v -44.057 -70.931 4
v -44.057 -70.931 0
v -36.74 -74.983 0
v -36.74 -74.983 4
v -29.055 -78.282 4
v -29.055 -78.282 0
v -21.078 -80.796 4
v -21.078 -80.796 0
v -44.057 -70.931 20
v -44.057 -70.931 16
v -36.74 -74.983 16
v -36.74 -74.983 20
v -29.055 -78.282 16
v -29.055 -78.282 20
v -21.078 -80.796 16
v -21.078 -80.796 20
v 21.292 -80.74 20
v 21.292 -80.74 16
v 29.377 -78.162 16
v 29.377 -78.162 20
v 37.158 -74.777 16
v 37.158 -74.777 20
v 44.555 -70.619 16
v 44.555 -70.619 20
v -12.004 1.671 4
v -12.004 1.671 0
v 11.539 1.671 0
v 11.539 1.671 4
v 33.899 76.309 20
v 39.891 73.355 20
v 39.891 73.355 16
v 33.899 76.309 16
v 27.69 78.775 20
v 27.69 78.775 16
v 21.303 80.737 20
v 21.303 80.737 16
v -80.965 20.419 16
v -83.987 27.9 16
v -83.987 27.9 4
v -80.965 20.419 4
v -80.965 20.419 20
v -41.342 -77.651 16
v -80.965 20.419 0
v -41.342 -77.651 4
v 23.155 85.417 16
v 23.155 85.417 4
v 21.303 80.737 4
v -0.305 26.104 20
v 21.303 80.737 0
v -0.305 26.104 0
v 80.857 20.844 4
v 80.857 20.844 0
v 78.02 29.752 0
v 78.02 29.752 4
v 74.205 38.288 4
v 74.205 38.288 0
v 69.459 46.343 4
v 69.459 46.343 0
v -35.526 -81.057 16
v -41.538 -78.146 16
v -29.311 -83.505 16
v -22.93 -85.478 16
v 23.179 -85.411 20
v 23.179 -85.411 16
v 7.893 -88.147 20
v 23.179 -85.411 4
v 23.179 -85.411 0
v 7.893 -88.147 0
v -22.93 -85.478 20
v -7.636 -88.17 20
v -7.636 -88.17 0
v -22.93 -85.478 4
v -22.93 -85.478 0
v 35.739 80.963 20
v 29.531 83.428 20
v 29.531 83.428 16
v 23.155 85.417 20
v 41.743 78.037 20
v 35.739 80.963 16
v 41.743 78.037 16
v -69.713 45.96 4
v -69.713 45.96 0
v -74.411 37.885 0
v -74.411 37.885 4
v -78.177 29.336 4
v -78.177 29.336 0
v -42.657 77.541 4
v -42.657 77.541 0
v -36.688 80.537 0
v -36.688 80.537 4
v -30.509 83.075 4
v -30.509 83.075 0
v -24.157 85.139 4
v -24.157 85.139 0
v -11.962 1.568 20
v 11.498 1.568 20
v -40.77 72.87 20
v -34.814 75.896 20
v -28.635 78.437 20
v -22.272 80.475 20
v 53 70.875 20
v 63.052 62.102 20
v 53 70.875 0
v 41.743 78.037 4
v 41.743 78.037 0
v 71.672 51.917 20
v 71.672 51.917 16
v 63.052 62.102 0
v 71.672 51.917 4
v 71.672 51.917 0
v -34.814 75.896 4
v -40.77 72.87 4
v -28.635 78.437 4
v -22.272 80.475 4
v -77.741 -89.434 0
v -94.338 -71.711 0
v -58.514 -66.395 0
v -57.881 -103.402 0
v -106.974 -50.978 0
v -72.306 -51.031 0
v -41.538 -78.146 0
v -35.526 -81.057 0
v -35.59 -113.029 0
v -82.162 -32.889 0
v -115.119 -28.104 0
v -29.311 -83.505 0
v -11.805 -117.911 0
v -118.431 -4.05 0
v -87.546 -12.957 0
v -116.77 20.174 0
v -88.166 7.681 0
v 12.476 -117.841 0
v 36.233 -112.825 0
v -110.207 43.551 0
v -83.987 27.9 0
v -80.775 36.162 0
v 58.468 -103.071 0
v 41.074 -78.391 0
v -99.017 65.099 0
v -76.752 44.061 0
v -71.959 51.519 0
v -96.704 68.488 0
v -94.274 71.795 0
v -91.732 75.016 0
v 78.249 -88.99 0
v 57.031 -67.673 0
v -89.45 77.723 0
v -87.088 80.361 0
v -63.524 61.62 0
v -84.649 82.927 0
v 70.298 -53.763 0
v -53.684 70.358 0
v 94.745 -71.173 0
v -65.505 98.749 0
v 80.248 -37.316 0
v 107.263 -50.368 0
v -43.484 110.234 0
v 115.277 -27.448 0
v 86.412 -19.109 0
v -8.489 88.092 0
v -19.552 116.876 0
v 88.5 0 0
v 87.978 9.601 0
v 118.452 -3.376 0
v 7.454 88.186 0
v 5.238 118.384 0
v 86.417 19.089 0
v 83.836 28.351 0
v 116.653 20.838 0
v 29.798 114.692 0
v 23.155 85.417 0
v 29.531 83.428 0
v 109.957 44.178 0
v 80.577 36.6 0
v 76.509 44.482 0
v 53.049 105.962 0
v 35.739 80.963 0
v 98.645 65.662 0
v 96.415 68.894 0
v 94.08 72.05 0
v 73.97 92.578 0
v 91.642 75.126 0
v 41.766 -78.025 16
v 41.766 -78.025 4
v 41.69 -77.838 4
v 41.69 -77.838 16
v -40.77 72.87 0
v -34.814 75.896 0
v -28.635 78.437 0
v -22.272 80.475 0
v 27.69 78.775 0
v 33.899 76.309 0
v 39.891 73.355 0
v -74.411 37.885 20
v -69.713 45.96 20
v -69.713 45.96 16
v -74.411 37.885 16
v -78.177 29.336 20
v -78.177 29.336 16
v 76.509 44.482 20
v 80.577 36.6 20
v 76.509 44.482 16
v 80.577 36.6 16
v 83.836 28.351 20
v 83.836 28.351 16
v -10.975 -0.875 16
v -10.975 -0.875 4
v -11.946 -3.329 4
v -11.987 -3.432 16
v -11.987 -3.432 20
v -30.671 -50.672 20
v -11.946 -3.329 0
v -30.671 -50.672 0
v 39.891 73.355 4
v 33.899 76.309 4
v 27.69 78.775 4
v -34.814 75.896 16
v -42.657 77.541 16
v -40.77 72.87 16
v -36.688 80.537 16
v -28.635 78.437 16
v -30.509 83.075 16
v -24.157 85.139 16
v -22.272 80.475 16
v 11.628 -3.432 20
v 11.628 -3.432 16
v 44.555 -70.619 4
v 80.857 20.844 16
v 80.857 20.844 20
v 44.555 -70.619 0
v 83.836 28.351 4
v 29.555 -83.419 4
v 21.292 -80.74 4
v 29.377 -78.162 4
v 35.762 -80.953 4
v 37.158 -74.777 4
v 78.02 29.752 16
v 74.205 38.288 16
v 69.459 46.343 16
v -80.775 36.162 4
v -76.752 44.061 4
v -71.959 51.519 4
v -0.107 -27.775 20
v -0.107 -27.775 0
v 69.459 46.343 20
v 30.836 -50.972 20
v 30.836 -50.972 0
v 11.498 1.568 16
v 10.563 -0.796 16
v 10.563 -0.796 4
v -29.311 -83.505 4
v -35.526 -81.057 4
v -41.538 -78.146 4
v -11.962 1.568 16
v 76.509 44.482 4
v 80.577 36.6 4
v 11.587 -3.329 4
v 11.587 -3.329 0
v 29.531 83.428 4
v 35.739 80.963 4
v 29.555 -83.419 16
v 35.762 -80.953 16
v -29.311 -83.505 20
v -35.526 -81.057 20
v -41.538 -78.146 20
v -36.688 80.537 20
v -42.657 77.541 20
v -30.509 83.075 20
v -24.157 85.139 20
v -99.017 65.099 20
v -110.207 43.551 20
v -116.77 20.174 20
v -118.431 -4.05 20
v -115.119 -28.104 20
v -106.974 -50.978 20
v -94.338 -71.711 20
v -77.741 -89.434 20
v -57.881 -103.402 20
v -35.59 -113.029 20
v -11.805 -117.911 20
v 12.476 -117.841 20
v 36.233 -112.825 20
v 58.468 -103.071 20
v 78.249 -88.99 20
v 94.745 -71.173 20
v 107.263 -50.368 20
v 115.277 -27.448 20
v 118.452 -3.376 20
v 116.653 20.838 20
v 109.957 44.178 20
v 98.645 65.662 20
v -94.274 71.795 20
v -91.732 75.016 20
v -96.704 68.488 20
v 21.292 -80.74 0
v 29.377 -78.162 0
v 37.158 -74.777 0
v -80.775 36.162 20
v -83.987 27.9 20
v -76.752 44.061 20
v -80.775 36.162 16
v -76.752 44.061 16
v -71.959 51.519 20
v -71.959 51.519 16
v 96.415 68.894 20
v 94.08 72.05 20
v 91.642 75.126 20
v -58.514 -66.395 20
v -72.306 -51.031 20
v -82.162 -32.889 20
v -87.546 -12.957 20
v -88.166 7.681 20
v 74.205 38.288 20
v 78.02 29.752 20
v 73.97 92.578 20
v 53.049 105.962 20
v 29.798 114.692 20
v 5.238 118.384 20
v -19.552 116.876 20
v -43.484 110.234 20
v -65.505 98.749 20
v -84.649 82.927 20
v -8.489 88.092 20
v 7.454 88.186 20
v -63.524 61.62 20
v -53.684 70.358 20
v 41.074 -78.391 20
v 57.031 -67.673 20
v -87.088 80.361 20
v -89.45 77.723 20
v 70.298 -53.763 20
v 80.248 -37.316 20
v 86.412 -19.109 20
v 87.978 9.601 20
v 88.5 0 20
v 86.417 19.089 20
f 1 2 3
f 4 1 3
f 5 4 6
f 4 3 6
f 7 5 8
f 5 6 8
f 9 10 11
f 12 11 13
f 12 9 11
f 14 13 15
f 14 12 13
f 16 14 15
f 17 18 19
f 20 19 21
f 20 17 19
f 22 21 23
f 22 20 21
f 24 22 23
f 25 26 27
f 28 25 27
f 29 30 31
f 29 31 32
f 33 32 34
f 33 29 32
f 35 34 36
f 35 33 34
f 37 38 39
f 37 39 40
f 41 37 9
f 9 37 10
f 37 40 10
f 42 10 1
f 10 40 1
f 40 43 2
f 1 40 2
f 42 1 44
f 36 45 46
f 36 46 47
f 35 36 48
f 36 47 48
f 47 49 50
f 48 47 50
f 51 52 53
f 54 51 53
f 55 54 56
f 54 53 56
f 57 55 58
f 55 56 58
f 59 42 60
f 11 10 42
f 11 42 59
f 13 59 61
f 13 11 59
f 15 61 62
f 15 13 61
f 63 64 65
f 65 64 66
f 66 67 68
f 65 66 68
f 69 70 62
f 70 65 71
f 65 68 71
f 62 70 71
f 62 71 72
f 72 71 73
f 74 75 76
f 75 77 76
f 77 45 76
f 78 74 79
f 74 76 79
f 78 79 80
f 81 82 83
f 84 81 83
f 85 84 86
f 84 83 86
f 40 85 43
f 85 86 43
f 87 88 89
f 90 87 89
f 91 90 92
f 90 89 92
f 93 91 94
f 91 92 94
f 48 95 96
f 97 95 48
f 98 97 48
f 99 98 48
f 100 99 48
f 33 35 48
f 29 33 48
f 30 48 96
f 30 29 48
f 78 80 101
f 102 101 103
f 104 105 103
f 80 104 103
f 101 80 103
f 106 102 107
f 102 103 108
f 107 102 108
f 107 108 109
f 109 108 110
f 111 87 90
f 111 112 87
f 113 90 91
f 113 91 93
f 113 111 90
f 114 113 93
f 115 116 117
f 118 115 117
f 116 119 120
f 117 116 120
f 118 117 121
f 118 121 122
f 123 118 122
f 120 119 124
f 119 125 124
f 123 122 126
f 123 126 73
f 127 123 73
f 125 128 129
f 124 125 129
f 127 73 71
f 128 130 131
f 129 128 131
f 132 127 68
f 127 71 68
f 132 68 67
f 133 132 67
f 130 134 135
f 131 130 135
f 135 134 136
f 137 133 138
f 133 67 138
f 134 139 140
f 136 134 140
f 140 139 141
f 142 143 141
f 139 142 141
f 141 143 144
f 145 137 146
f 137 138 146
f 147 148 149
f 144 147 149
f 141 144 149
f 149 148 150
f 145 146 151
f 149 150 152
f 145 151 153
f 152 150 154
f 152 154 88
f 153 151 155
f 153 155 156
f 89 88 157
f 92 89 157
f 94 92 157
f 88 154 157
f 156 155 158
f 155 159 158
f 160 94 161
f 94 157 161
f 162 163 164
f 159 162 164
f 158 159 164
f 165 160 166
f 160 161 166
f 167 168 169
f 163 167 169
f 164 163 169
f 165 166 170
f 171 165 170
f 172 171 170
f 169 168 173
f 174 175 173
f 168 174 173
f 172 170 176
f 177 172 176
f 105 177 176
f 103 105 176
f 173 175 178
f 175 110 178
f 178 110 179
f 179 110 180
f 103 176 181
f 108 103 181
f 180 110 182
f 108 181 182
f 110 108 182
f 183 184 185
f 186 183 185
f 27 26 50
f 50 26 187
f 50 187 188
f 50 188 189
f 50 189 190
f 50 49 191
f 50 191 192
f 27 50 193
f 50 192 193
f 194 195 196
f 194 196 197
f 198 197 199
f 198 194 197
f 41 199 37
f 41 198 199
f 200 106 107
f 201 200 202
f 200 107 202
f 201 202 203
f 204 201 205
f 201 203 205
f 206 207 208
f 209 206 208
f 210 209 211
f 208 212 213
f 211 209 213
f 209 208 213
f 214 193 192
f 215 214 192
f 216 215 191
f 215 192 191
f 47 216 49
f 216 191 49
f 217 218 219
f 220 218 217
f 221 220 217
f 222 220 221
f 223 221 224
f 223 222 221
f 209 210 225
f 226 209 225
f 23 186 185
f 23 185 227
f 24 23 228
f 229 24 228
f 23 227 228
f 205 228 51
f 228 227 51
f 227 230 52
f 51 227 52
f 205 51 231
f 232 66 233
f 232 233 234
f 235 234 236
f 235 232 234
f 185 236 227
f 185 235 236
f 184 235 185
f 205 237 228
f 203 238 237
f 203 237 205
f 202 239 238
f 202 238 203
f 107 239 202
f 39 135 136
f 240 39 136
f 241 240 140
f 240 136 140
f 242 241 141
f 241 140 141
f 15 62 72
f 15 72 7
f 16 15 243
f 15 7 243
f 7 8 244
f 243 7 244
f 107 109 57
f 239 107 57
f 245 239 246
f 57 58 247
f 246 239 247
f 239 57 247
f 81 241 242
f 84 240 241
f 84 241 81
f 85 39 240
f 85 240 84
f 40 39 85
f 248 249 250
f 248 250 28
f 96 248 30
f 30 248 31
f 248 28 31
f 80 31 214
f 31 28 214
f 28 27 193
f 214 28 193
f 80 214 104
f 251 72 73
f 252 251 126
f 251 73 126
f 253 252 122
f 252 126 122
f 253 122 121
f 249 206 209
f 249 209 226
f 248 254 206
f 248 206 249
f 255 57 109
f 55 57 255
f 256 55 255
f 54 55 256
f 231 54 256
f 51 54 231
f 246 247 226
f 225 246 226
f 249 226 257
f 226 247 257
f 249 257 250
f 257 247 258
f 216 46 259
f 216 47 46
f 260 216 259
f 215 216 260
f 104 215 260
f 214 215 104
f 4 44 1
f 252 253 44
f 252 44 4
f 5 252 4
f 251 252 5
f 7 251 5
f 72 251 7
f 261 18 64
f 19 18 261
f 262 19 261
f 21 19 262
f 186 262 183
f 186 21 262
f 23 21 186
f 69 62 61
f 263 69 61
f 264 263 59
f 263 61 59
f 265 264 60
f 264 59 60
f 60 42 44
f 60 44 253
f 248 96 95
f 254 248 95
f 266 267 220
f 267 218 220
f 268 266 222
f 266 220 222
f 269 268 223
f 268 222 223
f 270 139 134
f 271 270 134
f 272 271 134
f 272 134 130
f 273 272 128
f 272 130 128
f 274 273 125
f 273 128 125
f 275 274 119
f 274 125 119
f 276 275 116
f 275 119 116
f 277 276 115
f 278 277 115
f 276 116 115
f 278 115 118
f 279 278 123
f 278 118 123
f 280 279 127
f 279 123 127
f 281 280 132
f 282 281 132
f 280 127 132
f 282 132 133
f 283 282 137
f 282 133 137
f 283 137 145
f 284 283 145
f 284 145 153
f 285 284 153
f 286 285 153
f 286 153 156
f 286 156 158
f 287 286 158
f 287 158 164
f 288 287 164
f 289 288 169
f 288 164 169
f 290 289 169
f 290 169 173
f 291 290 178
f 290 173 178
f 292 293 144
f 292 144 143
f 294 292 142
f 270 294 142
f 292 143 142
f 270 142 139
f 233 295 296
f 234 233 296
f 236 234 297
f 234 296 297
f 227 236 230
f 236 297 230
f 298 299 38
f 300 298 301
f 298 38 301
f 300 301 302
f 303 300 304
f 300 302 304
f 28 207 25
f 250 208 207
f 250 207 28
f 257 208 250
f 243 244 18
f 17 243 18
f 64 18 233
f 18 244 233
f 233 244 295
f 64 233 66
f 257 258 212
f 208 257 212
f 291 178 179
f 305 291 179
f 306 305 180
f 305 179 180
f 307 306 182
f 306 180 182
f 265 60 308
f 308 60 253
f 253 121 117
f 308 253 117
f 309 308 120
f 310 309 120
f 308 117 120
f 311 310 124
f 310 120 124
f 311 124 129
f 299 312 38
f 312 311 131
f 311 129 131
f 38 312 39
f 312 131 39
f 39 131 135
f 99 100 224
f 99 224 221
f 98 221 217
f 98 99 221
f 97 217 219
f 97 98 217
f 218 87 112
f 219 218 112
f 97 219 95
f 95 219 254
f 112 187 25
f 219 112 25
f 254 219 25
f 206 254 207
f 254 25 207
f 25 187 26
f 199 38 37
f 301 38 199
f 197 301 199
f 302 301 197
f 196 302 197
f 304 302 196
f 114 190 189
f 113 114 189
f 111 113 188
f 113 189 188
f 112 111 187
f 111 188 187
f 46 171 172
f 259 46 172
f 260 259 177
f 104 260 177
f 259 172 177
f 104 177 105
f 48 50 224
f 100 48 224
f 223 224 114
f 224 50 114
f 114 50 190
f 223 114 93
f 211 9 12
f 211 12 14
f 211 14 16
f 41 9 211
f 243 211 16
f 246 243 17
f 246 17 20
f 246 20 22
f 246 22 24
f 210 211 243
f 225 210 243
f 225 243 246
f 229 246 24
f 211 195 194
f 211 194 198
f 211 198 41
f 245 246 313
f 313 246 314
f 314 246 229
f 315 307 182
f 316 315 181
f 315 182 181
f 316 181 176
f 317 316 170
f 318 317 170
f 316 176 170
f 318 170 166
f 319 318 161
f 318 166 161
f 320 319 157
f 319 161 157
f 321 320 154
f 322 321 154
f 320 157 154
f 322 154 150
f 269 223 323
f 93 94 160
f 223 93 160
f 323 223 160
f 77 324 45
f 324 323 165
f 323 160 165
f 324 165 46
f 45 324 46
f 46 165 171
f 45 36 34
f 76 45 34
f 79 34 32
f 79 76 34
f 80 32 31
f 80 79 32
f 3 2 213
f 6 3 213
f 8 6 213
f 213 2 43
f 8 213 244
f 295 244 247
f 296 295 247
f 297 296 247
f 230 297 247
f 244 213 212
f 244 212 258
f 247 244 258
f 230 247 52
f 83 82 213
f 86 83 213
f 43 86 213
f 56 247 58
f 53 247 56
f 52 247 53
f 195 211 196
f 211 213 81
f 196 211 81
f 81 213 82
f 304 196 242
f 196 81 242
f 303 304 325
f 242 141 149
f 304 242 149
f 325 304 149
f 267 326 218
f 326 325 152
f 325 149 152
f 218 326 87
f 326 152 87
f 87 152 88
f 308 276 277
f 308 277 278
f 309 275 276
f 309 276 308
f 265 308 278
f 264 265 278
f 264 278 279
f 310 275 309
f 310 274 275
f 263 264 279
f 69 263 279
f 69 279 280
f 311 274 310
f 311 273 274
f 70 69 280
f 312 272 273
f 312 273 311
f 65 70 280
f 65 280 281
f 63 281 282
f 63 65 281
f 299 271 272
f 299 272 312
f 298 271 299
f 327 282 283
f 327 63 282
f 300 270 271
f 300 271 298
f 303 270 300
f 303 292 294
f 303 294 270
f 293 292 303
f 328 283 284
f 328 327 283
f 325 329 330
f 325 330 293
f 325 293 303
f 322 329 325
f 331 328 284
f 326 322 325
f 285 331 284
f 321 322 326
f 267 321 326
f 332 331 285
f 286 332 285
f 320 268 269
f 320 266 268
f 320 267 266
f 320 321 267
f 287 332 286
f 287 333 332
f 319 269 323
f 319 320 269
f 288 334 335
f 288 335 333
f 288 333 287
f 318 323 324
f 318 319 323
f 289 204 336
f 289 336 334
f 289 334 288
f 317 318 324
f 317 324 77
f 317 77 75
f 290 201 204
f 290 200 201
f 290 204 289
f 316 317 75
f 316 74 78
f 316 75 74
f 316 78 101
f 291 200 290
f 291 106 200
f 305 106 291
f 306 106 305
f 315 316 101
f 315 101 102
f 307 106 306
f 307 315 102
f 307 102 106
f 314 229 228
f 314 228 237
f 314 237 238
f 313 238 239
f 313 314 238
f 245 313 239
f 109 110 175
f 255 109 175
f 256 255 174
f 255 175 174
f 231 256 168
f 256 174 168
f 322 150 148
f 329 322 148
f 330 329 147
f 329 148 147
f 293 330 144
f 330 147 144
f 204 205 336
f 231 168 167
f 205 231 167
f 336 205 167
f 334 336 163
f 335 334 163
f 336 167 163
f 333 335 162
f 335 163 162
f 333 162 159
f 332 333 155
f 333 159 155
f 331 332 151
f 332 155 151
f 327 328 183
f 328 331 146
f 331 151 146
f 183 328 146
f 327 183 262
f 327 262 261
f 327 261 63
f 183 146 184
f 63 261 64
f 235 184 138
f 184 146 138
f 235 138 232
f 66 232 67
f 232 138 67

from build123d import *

# Parameters (mm, degrees)
F1_DEPTH  = 20
F3_DEPTH  = 20
F2_R      = 88.5
F2_R_2    = 83.5
F4_DEPTH  = 4
F6_DEPTH  = 4
F8_DEPTH  = 4
F10_DEPTH = 4


with BuildPart() as f1:
    # F0 (on Top) → F1 (new body)
    with BuildSketch(Plane.XY):
        with BuildLine():
            ThreePointArc((-99.0167204009, 65.0994553054), (-33.976231637, -113.5247359995), (118.5, 0))
            ThreePointArc((118.5, 0), (113.427568701, 34.2992224195), (98.6445289691, 65.6620659473))
            Line((98.6445289691, 65.6620659473), (83.8359894773, 28.3509588615))
            ThreePointArc((83.8359894773, 28.3509588615), (87.3262133289, 14.3660177374), (88.5, 0))
            ThreePointArc((88.5, 0), (75.9227513097, -45.4751122436), (41.7658568686, -78.0247601729))
            ThreePointArc((41.7658568686, -78.0247601729), (37.4975464632, -80.1634830159), (33.1201145514, -82.0689223282))
            ThreePointArc((33.1201145514, -82.0689223282), (28.1992209584, -83.8871500132), (23.1792402745, -85.4106130425))
            ThreePointArc((23.1792402745, -85.4106130425), (0.1291202837, -88.4999058076), (-22.9299160381, -85.4778857395))
            ThreePointArc((-22.9299160381, -85.4778857395), (-27.7305413867, -84.0432452634), (-32.4422838504, -82.3392264876))
            ThreePointArc((-32.4422838504, -82.3392264876), (-37.0493645428, -80.3716031131), (-41.5377286395, -78.1464464929))
            ThreePointArc((-41.5377286395, -78.1464464929), (-82.1619405668, -32.888683803), (-83.9871522499, 27.8999687625))
            Line((-83.9871522499, 27.8999687625), (-99.0167204009, 65.0994553054))
        make_face()
        with BuildLine():
            Line((83.8359894773, 28.3509588615), (98.6445289691, 65.6620659473))
            ThreePointArc((98.6445289691, 65.6620659473), (95.2609020622, 70.4812779275), (91.6420527878, 75.1264544673))
            Line((91.6420527878, 75.1264544673), (78.2404891828, 41.3603173639))
            ThreePointArc((78.2404891828, 41.3603173639), (81.2988750591, 34.9677410499), (83.8359894773, 28.3509588615))
        make_face()
        with BuildLine():
            ThreePointArc((-91.7323358048, 75.0161887049), (-95.5033298433, 70.1524339481), (-99.0167204009, 65.0994553054))
            Line((-99.0167204009, 65.0994553054), (-83.9871522499, 27.8999687625))
            ThreePointArc((-83.9871522499, 27.8999687625), (-81.3673031633, 34.8082170749), (-78.1803580333, 41.4738666848))
            Line((-78.1803580333, 41.4738666848), (-91.7323358048, 75.0161887049))
        make_face()
        with BuildLine():
            Line((78.2404891828, 41.3603173639), (91.6420527878, 75.1264544673))
            ThreePointArc((91.6420527878, 75.1264544673), (88.0042632721, 79.3567870187), (84.1713836102, 83.4111993748))
            Line((84.1713836102, 83.4111993748), (71.6717000696, 51.9174094994))
            ThreePointArc((71.6717000696, 51.9174094994), (75.141727224, 46.7543669597), (78.2404891828, 41.3603173639))
        make_face()
        with BuildLine():
            ThreePointArc((-84.6487172303, 82.9267427991), (-88.279177522, 79.0508495593), (-91.7323358048, 75.0161887049))
            Line((-91.7323358048, 75.0161887049), (-78.1803580333, 41.4738666848))
            ThreePointArc((-78.1803580333, 41.4738666848), (-75.2374774209, 46.6001286623), (-71.9589677924, 51.5185107923))
            Line((-71.9589677924, 51.5185107923), (-84.6487172303, 82.9267427991))
        make_face()
        with BuildLine():
            Line((71.6717000696, 51.9174094994), (84.1713836102, 83.4111993748))
            ThreePointArc((84.1713836102, 83.4111993748), (-0.34005351, 118.4995120817), (-84.6487172303, 82.9267427991))
            Line((-84.6487172303, 82.9267427991), (-71.9589677924, 51.5185107923))
            ThreePointArc((-71.9589677924, 51.5185107923), (-58.7666735297, 66.1719584285), (-42.657447205, 77.5409066104))
            ThreePointArc((-42.657447205, 77.5409066104), (-37.9880889567, 79.9321906207), (-33.1852472612, 82.0426070052))
            ThreePointArc((-33.1852472612, 82.0426070052), (-28.7127568961, 83.7127683894), (-24.1567096164, 85.1393174774))
            ThreePointArc((-24.1567096164, 85.1393174774), (-0.5199906824, 88.4984723579), (23.1545696711, 85.4173044725))
            ThreePointArc((23.1545696711, 85.4173044725), (27.9506996195, 83.9702827837), (32.6572676565, 82.2541966663))
            ThreePointArc((32.6572676565, 82.2541966663), (37.2598684434, 80.274231255), (41.7430426186, 78.0369681173))
            ThreePointArc((41.7430426186, 78.0369681173), (58.1917846466, 66.6780788538), (71.6717000696, 51.9174094994))
        make_face()
    extrude(amount=F1_DEPTH)

    # F0 (on Top) → F3 (join)
    with BuildSketch(Plane.XY):
        Polygon((-5.3900272877, 13.2470234608), (-10.9754492604, -0.8747899922), (-5.5413465001, -14.3246662942), (0.0440754726, -0.2028528412), align=None)
        Polygon((-5.5413465001, -14.3246662942), (-0.1072437399, -27.7745425962), (5.4781782329, -13.6527291432), (0.0440754726, -0.2028528412), align=None)
        Polygon((5.4781782329, -13.6527291432), (10.5633239718, -0.7957812068), (5.1292212115, 12.6540950952), (0.0440754726, -0.2028528412), align=None)
        Polygon((0.0440754726, -0.2028528412), (5.1292212115, 12.6540950952), (-0.3048815487, 26.1039713972), (-5.3900272877, 13.2470234608), align=None)
        Polygon((-10.9754492604, -0.8747899922), (-30.6712140088, -50.6722658047), (-25.2371112485, -64.1221421067), (-5.5413465001, -14.3246662942), align=None)
        with BuildLine():
            Line((-25.2371112485, -64.1221421067), (-32.4422838504, -82.3392264876))
            ThreePointArc((-32.4422838504, -82.3392264876), (-27.7305413867, -84.0432452634), (-22.9299160381, -85.4778857395))
            Line((-22.9299160381, -85.4778857395), (-0.1072437399, -27.7745425962))
            Line((-0.1072437399, -27.7745425962), (-5.5413465001, -14.3246662942))
            Line((-5.5413465001, -14.3246662942), (-25.2371112485, -64.1221421067))
        make_face()
        with BuildLine():
            Line((-41.3417817205, -77.6510271941), (-41.5377286395, -78.1464464929))
            ThreePointArc((-41.5377286395, -78.1464464929), (-37.0493645428, -80.3716031131), (-32.4422838504, -82.3392264876))
            Line((-32.4422838504, -82.3392264876), (-25.2371112485, -64.1221421067))
            Line((-25.2371112485, -64.1221421067), (-30.6712140088, -50.6722658047))
            Line((-30.6712140088, -50.6722658047), (-35.7563597477, -63.5292137411))
            Line((-35.7563597477, -63.5292137411), (-41.3417817205, -77.6510271941))
        make_face()
        with BuildLine():
            ThreePointArc((-71.9589677924, 51.5185107923), (-75.2374774209, 46.6001286623), (-78.1803580333, 41.4738666848))
            Line((-78.1803580333, 41.4738666848), (-35.7563597477, -63.5292137411))
            Line((-35.7563597477, -63.5292137411), (-30.6712140088, -50.6722658047))
            Line((-30.6712140088, -50.6722658047), (-71.9589677924, 51.5185107923))
        make_face()
        with BuildLine():
            ThreePointArc((-78.1803580333, 41.4738666848), (-81.3673031633, 34.8082170749), (-83.9871522499, 27.8999687625))
            Line((-83.9871522499, 27.8999687625), (-41.3417817205, -77.6510271941))
            Line((-41.3417817205, -77.6510271941), (-35.7563597477, -63.5292137411))
            Line((-35.7563597477, -63.5292137411), (-78.1803580333, 41.4738666848))
        make_face()
        with BuildLine():
            Line((5.1292212115, 12.6540950952), (32.6572676565, 82.2541966663))
            ThreePointArc((32.6572676565, 82.2541966663), (27.9506996195, 83.9702827837), (23.1545696711, 85.4173044725))
            Line((23.1545696711, 85.4173044725), (-0.3048815487, 26.1039713972))
            Line((-0.3048815487, 26.1039713972), (5.1292212115, 12.6540950952))
        make_face()
        with BuildLine():
            Line((10.5633239718, -0.7957812068), (41.7430426186, 78.0369681173))
            ThreePointArc((41.7430426186, 78.0369681173), (37.2598684434, 80.274231255), (32.6572676565, 82.2541966663))
            Line((32.6572676565, 82.2541966663), (5.1292212115, 12.6540950952))
            Line((5.1292212115, 12.6540950952), (10.5633239718, -0.7957812068))
        make_face()
        with BuildLine():
            ThreePointArc((-33.1852472612, 82.0426070052), (-37.9880889567, 79.9321906207), (-42.657447205, 77.5409066104))
            Line((-42.657447205, 77.5409066104), (-10.9754492604, -0.8747899922))
            Line((-10.9754492604, -0.8747899922), (-5.3900272877, 13.2470234608))
            Line((-5.3900272877, 13.2470234608), (-33.1852472612, 82.0426070052))
        make_face()
        with BuildLine():
            ThreePointArc((-24.1567096164, 85.1393174774), (-28.7127568961, 83.7127683894), (-33.1852472612, 82.0426070052))
            Line((-33.1852472612, 82.0426070052), (-5.3900272877, 13.2470234608))
            Line((-5.3900272877, 13.2470234608), (-0.3048815487, 26.1039713972))
            Line((-0.3048815487, 26.1039713972), (-24.1567096164, 85.1393174774))
        make_face()
        with BuildLine():
            ThreePointArc((23.1792402745, -85.4106130425), (28.1992209584, -83.8871500132), (33.1201145514, -82.0689223282))
            Line((33.1201145514, -82.0689223282), (25.7416192077, -63.806505505))
            Line((25.7416192077, -63.806505505), (5.4781782329, -13.6527291432))
            Line((5.4781782329, -13.6527291432), (-0.1072437399, -27.7745425962))
            Line((-0.1072437399, -27.7745425962), (23.1792402745, -85.4106130425))
        make_face()
        Polygon((25.7416192077, -63.806505505), (30.8356910223, -50.971650381), (10.5633239718, -0.7957812068), (5.4781782329, -13.6527291432), align=None)
        with BuildLine():
            Line((41.7658568686, -78.0247601729), (41.6903356821, -77.8378386773))
            Line((41.6903356821, -77.8378386773), (36.2630133522, -64.4047445292))
            Line((36.2630133522, -64.4047445292), (30.8356910223, -50.971650381))
            Line((30.8356910223, -50.971650381), (25.7416192077, -63.806505505))
            Line((25.7416192077, -63.806505505), (33.1201145514, -82.0689223282))
            ThreePointArc((33.1201145514, -82.0689223282), (37.4975464632, -80.1634830159), (41.7658568686, -78.0247601729))
        make_face()
        with BuildLine():
            Line((41.6903356821, -77.8378386773), (83.8359894773, 28.3509588615))
            ThreePointArc((83.8359894773, 28.3509588615), (81.2988750591, 34.9677410499), (78.2404891828, 41.3603173639))
            Line((78.2404891828, 41.3603173639), (36.2630133522, -64.4047445292))
            Line((36.2630133522, -64.4047445292), (41.6903356821, -77.8378386773))
        make_face()
        with BuildLine():
            Line((36.2630133522, -64.4047445292), (78.2404891828, 41.3603173639))
            ThreePointArc((78.2404891828, 41.3603173639), (75.141727224, 46.7543669597), (71.6717000696, 51.9174094994))
            Line((71.6717000696, 51.9174094994), (30.8356910223, -50.971650381))
            Line((30.8356910223, -50.971650381), (36.2630133522, -64.4047445292))
        make_face()
    extrude(amount=F3_DEPTH)

    # F2 (on face) → F4 (cut)
    with BuildSketch(Plane.XY.offset(20)):
        Circle(F2_R)
        Circle(F2_R_2, mode=Mode.SUBTRACT)
    extrude(amount=-F4_DEPTH, mode=Mode.SUBTRACT)

    # F5 (on face) → F6 (cut)
    with BuildSketch(Plane(origin=(0, 0, 0), x_dir=(1, 0, 0), z_dir=(0, 0, -1))):
        with BuildLine():
            ThreePointArc((83.8359894773, -28.3509588615), (87.3262133289, -14.3660177374), (88.5, 0))
            ThreePointArc((88.5, 0), (-27.0544021406, 84.2633332168), (-71.9589677924, -51.5185107923))
            ThreePointArc((-71.9589677924, -51.5185107923), (-58.7666735297, -66.1719584285), (-42.657447205, -77.5409066104))
            ThreePointArc((-42.657447205, -77.5409066104), (-33.6224158838, -81.8644193172), (-24.1567096164, -85.1393174774))
            ThreePointArc((-24.1567096164, -85.1393174774), (-0.5199906824, -88.4984723579), (23.1545696711, -85.4173044725))
            ThreePointArc((23.1545696711, -85.4173044725), (32.6579601538, -82.2539217217), (41.7430426186, -78.0369681173))
            ThreePointArc((41.7430426186, -78.0369681173), (58.1917846466, -66.6780788538), (71.6717000696, -51.9174094994))
            ThreePointArc((71.6717000696, -51.9174094994), (78.6416224144, -40.5924281613), (83.8359894773, -28.3509588615))
        make_face()
        with BuildLine():
            ThreePointArc((44.555375213, 70.6191796868), (73.1184786162, 40.3229225734), (83.5, 0))
            ThreePointArc((83.5, 0), (82.836495174, -10.5054779659), (80.8565253343, -20.843999397))
            ThreePointArc((80.8565253343, -20.843999397), (76.2315862582, -34.0733804687), (69.4592219568, -46.3429227084))
            ThreePointArc((69.4592219568, -46.3429227084), (56.3186534083, -61.6478651559), (39.8912046999, -73.3549029554))
            ThreePointArc((39.8912046999, -73.3549029554), (30.8190728646, -77.6043474798), (21.3033189694, -80.7367239915))
            ThreePointArc((21.3033189694, -80.7367239915), (-0.501796062, -83.4984922062), (-22.2721428532, -80.4748510575))
            ThreePointArc((-22.2721428532, -80.4748510575), (-31.7497249631, -77.2282653228), (-40.7702727747, -72.8699859879))
            ThreePointArc((-40.7702727747, -72.8699859879), (-56.8567093495, -61.1519795423), (-69.7131848128, -45.9600028639))
            ThreePointArc((-69.7131848128, -45.9600028639), (-76.4136411743, -33.6631169454), (-80.9647996196, -20.4193835008))
            ThreePointArc((-80.9647996196, -20.4193835008), (-77.4198518563, 31.2796505502), (-44.0567071244, 70.9313510188))
            ThreePointArc((-44.0567071244, 70.9313510188), (-32.938761393, 76.7286647733), (-21.0780781193, 80.7958205775))
            ThreePointArc((-21.0780781193, 80.7958205775), (0.1106131959, 83.4999267348), (21.2920658442, 80.7396924201))
            ThreePointArc((21.2920658442, 80.7396924201), (33.3103222431, 76.5680901685), (44.555375213, 70.6191796868))
        make_face(mode=Mode.SUBTRACT)
    extrude(amount=-F6_DEPTH, mode=Mode.SUBTRACT)

    # F7 (on face) → F8 (cut)
    with BuildSketch(Plane.XY.offset(20)):
        Polygon((11.4983377003, 1.5682459902), (-11.9624998679, 1.5682459902), (-10.9754492604, -0.8747899922), (-11.9867728454, -3.4317540098), (11.6283261148, -3.4317540098), (10.5633239718, -0.7957812068), align=None)
    extrude(amount=-F8_DEPTH, mode=Mode.SUBTRACT)

    # F9 (on face) → F10 (cut)
    with BuildSketch(Plane(origin=(0, 0, 0), x_dir=(1, 0, 0), z_dir=(0, 0, -1))):
        Polygon((11.5868667585, 3.329138502), (-11.9461866336, 3.329138502), (-10.9754492604, 0.8747899922), (-12.0039592243, -1.670861498), (11.5389239122, -1.670861498), (10.5633239718, 0.7957812068), align=None)
    extrude(amount=-F10_DEPTH, mode=Mode.SUBTRACT)


solid = f1.part
